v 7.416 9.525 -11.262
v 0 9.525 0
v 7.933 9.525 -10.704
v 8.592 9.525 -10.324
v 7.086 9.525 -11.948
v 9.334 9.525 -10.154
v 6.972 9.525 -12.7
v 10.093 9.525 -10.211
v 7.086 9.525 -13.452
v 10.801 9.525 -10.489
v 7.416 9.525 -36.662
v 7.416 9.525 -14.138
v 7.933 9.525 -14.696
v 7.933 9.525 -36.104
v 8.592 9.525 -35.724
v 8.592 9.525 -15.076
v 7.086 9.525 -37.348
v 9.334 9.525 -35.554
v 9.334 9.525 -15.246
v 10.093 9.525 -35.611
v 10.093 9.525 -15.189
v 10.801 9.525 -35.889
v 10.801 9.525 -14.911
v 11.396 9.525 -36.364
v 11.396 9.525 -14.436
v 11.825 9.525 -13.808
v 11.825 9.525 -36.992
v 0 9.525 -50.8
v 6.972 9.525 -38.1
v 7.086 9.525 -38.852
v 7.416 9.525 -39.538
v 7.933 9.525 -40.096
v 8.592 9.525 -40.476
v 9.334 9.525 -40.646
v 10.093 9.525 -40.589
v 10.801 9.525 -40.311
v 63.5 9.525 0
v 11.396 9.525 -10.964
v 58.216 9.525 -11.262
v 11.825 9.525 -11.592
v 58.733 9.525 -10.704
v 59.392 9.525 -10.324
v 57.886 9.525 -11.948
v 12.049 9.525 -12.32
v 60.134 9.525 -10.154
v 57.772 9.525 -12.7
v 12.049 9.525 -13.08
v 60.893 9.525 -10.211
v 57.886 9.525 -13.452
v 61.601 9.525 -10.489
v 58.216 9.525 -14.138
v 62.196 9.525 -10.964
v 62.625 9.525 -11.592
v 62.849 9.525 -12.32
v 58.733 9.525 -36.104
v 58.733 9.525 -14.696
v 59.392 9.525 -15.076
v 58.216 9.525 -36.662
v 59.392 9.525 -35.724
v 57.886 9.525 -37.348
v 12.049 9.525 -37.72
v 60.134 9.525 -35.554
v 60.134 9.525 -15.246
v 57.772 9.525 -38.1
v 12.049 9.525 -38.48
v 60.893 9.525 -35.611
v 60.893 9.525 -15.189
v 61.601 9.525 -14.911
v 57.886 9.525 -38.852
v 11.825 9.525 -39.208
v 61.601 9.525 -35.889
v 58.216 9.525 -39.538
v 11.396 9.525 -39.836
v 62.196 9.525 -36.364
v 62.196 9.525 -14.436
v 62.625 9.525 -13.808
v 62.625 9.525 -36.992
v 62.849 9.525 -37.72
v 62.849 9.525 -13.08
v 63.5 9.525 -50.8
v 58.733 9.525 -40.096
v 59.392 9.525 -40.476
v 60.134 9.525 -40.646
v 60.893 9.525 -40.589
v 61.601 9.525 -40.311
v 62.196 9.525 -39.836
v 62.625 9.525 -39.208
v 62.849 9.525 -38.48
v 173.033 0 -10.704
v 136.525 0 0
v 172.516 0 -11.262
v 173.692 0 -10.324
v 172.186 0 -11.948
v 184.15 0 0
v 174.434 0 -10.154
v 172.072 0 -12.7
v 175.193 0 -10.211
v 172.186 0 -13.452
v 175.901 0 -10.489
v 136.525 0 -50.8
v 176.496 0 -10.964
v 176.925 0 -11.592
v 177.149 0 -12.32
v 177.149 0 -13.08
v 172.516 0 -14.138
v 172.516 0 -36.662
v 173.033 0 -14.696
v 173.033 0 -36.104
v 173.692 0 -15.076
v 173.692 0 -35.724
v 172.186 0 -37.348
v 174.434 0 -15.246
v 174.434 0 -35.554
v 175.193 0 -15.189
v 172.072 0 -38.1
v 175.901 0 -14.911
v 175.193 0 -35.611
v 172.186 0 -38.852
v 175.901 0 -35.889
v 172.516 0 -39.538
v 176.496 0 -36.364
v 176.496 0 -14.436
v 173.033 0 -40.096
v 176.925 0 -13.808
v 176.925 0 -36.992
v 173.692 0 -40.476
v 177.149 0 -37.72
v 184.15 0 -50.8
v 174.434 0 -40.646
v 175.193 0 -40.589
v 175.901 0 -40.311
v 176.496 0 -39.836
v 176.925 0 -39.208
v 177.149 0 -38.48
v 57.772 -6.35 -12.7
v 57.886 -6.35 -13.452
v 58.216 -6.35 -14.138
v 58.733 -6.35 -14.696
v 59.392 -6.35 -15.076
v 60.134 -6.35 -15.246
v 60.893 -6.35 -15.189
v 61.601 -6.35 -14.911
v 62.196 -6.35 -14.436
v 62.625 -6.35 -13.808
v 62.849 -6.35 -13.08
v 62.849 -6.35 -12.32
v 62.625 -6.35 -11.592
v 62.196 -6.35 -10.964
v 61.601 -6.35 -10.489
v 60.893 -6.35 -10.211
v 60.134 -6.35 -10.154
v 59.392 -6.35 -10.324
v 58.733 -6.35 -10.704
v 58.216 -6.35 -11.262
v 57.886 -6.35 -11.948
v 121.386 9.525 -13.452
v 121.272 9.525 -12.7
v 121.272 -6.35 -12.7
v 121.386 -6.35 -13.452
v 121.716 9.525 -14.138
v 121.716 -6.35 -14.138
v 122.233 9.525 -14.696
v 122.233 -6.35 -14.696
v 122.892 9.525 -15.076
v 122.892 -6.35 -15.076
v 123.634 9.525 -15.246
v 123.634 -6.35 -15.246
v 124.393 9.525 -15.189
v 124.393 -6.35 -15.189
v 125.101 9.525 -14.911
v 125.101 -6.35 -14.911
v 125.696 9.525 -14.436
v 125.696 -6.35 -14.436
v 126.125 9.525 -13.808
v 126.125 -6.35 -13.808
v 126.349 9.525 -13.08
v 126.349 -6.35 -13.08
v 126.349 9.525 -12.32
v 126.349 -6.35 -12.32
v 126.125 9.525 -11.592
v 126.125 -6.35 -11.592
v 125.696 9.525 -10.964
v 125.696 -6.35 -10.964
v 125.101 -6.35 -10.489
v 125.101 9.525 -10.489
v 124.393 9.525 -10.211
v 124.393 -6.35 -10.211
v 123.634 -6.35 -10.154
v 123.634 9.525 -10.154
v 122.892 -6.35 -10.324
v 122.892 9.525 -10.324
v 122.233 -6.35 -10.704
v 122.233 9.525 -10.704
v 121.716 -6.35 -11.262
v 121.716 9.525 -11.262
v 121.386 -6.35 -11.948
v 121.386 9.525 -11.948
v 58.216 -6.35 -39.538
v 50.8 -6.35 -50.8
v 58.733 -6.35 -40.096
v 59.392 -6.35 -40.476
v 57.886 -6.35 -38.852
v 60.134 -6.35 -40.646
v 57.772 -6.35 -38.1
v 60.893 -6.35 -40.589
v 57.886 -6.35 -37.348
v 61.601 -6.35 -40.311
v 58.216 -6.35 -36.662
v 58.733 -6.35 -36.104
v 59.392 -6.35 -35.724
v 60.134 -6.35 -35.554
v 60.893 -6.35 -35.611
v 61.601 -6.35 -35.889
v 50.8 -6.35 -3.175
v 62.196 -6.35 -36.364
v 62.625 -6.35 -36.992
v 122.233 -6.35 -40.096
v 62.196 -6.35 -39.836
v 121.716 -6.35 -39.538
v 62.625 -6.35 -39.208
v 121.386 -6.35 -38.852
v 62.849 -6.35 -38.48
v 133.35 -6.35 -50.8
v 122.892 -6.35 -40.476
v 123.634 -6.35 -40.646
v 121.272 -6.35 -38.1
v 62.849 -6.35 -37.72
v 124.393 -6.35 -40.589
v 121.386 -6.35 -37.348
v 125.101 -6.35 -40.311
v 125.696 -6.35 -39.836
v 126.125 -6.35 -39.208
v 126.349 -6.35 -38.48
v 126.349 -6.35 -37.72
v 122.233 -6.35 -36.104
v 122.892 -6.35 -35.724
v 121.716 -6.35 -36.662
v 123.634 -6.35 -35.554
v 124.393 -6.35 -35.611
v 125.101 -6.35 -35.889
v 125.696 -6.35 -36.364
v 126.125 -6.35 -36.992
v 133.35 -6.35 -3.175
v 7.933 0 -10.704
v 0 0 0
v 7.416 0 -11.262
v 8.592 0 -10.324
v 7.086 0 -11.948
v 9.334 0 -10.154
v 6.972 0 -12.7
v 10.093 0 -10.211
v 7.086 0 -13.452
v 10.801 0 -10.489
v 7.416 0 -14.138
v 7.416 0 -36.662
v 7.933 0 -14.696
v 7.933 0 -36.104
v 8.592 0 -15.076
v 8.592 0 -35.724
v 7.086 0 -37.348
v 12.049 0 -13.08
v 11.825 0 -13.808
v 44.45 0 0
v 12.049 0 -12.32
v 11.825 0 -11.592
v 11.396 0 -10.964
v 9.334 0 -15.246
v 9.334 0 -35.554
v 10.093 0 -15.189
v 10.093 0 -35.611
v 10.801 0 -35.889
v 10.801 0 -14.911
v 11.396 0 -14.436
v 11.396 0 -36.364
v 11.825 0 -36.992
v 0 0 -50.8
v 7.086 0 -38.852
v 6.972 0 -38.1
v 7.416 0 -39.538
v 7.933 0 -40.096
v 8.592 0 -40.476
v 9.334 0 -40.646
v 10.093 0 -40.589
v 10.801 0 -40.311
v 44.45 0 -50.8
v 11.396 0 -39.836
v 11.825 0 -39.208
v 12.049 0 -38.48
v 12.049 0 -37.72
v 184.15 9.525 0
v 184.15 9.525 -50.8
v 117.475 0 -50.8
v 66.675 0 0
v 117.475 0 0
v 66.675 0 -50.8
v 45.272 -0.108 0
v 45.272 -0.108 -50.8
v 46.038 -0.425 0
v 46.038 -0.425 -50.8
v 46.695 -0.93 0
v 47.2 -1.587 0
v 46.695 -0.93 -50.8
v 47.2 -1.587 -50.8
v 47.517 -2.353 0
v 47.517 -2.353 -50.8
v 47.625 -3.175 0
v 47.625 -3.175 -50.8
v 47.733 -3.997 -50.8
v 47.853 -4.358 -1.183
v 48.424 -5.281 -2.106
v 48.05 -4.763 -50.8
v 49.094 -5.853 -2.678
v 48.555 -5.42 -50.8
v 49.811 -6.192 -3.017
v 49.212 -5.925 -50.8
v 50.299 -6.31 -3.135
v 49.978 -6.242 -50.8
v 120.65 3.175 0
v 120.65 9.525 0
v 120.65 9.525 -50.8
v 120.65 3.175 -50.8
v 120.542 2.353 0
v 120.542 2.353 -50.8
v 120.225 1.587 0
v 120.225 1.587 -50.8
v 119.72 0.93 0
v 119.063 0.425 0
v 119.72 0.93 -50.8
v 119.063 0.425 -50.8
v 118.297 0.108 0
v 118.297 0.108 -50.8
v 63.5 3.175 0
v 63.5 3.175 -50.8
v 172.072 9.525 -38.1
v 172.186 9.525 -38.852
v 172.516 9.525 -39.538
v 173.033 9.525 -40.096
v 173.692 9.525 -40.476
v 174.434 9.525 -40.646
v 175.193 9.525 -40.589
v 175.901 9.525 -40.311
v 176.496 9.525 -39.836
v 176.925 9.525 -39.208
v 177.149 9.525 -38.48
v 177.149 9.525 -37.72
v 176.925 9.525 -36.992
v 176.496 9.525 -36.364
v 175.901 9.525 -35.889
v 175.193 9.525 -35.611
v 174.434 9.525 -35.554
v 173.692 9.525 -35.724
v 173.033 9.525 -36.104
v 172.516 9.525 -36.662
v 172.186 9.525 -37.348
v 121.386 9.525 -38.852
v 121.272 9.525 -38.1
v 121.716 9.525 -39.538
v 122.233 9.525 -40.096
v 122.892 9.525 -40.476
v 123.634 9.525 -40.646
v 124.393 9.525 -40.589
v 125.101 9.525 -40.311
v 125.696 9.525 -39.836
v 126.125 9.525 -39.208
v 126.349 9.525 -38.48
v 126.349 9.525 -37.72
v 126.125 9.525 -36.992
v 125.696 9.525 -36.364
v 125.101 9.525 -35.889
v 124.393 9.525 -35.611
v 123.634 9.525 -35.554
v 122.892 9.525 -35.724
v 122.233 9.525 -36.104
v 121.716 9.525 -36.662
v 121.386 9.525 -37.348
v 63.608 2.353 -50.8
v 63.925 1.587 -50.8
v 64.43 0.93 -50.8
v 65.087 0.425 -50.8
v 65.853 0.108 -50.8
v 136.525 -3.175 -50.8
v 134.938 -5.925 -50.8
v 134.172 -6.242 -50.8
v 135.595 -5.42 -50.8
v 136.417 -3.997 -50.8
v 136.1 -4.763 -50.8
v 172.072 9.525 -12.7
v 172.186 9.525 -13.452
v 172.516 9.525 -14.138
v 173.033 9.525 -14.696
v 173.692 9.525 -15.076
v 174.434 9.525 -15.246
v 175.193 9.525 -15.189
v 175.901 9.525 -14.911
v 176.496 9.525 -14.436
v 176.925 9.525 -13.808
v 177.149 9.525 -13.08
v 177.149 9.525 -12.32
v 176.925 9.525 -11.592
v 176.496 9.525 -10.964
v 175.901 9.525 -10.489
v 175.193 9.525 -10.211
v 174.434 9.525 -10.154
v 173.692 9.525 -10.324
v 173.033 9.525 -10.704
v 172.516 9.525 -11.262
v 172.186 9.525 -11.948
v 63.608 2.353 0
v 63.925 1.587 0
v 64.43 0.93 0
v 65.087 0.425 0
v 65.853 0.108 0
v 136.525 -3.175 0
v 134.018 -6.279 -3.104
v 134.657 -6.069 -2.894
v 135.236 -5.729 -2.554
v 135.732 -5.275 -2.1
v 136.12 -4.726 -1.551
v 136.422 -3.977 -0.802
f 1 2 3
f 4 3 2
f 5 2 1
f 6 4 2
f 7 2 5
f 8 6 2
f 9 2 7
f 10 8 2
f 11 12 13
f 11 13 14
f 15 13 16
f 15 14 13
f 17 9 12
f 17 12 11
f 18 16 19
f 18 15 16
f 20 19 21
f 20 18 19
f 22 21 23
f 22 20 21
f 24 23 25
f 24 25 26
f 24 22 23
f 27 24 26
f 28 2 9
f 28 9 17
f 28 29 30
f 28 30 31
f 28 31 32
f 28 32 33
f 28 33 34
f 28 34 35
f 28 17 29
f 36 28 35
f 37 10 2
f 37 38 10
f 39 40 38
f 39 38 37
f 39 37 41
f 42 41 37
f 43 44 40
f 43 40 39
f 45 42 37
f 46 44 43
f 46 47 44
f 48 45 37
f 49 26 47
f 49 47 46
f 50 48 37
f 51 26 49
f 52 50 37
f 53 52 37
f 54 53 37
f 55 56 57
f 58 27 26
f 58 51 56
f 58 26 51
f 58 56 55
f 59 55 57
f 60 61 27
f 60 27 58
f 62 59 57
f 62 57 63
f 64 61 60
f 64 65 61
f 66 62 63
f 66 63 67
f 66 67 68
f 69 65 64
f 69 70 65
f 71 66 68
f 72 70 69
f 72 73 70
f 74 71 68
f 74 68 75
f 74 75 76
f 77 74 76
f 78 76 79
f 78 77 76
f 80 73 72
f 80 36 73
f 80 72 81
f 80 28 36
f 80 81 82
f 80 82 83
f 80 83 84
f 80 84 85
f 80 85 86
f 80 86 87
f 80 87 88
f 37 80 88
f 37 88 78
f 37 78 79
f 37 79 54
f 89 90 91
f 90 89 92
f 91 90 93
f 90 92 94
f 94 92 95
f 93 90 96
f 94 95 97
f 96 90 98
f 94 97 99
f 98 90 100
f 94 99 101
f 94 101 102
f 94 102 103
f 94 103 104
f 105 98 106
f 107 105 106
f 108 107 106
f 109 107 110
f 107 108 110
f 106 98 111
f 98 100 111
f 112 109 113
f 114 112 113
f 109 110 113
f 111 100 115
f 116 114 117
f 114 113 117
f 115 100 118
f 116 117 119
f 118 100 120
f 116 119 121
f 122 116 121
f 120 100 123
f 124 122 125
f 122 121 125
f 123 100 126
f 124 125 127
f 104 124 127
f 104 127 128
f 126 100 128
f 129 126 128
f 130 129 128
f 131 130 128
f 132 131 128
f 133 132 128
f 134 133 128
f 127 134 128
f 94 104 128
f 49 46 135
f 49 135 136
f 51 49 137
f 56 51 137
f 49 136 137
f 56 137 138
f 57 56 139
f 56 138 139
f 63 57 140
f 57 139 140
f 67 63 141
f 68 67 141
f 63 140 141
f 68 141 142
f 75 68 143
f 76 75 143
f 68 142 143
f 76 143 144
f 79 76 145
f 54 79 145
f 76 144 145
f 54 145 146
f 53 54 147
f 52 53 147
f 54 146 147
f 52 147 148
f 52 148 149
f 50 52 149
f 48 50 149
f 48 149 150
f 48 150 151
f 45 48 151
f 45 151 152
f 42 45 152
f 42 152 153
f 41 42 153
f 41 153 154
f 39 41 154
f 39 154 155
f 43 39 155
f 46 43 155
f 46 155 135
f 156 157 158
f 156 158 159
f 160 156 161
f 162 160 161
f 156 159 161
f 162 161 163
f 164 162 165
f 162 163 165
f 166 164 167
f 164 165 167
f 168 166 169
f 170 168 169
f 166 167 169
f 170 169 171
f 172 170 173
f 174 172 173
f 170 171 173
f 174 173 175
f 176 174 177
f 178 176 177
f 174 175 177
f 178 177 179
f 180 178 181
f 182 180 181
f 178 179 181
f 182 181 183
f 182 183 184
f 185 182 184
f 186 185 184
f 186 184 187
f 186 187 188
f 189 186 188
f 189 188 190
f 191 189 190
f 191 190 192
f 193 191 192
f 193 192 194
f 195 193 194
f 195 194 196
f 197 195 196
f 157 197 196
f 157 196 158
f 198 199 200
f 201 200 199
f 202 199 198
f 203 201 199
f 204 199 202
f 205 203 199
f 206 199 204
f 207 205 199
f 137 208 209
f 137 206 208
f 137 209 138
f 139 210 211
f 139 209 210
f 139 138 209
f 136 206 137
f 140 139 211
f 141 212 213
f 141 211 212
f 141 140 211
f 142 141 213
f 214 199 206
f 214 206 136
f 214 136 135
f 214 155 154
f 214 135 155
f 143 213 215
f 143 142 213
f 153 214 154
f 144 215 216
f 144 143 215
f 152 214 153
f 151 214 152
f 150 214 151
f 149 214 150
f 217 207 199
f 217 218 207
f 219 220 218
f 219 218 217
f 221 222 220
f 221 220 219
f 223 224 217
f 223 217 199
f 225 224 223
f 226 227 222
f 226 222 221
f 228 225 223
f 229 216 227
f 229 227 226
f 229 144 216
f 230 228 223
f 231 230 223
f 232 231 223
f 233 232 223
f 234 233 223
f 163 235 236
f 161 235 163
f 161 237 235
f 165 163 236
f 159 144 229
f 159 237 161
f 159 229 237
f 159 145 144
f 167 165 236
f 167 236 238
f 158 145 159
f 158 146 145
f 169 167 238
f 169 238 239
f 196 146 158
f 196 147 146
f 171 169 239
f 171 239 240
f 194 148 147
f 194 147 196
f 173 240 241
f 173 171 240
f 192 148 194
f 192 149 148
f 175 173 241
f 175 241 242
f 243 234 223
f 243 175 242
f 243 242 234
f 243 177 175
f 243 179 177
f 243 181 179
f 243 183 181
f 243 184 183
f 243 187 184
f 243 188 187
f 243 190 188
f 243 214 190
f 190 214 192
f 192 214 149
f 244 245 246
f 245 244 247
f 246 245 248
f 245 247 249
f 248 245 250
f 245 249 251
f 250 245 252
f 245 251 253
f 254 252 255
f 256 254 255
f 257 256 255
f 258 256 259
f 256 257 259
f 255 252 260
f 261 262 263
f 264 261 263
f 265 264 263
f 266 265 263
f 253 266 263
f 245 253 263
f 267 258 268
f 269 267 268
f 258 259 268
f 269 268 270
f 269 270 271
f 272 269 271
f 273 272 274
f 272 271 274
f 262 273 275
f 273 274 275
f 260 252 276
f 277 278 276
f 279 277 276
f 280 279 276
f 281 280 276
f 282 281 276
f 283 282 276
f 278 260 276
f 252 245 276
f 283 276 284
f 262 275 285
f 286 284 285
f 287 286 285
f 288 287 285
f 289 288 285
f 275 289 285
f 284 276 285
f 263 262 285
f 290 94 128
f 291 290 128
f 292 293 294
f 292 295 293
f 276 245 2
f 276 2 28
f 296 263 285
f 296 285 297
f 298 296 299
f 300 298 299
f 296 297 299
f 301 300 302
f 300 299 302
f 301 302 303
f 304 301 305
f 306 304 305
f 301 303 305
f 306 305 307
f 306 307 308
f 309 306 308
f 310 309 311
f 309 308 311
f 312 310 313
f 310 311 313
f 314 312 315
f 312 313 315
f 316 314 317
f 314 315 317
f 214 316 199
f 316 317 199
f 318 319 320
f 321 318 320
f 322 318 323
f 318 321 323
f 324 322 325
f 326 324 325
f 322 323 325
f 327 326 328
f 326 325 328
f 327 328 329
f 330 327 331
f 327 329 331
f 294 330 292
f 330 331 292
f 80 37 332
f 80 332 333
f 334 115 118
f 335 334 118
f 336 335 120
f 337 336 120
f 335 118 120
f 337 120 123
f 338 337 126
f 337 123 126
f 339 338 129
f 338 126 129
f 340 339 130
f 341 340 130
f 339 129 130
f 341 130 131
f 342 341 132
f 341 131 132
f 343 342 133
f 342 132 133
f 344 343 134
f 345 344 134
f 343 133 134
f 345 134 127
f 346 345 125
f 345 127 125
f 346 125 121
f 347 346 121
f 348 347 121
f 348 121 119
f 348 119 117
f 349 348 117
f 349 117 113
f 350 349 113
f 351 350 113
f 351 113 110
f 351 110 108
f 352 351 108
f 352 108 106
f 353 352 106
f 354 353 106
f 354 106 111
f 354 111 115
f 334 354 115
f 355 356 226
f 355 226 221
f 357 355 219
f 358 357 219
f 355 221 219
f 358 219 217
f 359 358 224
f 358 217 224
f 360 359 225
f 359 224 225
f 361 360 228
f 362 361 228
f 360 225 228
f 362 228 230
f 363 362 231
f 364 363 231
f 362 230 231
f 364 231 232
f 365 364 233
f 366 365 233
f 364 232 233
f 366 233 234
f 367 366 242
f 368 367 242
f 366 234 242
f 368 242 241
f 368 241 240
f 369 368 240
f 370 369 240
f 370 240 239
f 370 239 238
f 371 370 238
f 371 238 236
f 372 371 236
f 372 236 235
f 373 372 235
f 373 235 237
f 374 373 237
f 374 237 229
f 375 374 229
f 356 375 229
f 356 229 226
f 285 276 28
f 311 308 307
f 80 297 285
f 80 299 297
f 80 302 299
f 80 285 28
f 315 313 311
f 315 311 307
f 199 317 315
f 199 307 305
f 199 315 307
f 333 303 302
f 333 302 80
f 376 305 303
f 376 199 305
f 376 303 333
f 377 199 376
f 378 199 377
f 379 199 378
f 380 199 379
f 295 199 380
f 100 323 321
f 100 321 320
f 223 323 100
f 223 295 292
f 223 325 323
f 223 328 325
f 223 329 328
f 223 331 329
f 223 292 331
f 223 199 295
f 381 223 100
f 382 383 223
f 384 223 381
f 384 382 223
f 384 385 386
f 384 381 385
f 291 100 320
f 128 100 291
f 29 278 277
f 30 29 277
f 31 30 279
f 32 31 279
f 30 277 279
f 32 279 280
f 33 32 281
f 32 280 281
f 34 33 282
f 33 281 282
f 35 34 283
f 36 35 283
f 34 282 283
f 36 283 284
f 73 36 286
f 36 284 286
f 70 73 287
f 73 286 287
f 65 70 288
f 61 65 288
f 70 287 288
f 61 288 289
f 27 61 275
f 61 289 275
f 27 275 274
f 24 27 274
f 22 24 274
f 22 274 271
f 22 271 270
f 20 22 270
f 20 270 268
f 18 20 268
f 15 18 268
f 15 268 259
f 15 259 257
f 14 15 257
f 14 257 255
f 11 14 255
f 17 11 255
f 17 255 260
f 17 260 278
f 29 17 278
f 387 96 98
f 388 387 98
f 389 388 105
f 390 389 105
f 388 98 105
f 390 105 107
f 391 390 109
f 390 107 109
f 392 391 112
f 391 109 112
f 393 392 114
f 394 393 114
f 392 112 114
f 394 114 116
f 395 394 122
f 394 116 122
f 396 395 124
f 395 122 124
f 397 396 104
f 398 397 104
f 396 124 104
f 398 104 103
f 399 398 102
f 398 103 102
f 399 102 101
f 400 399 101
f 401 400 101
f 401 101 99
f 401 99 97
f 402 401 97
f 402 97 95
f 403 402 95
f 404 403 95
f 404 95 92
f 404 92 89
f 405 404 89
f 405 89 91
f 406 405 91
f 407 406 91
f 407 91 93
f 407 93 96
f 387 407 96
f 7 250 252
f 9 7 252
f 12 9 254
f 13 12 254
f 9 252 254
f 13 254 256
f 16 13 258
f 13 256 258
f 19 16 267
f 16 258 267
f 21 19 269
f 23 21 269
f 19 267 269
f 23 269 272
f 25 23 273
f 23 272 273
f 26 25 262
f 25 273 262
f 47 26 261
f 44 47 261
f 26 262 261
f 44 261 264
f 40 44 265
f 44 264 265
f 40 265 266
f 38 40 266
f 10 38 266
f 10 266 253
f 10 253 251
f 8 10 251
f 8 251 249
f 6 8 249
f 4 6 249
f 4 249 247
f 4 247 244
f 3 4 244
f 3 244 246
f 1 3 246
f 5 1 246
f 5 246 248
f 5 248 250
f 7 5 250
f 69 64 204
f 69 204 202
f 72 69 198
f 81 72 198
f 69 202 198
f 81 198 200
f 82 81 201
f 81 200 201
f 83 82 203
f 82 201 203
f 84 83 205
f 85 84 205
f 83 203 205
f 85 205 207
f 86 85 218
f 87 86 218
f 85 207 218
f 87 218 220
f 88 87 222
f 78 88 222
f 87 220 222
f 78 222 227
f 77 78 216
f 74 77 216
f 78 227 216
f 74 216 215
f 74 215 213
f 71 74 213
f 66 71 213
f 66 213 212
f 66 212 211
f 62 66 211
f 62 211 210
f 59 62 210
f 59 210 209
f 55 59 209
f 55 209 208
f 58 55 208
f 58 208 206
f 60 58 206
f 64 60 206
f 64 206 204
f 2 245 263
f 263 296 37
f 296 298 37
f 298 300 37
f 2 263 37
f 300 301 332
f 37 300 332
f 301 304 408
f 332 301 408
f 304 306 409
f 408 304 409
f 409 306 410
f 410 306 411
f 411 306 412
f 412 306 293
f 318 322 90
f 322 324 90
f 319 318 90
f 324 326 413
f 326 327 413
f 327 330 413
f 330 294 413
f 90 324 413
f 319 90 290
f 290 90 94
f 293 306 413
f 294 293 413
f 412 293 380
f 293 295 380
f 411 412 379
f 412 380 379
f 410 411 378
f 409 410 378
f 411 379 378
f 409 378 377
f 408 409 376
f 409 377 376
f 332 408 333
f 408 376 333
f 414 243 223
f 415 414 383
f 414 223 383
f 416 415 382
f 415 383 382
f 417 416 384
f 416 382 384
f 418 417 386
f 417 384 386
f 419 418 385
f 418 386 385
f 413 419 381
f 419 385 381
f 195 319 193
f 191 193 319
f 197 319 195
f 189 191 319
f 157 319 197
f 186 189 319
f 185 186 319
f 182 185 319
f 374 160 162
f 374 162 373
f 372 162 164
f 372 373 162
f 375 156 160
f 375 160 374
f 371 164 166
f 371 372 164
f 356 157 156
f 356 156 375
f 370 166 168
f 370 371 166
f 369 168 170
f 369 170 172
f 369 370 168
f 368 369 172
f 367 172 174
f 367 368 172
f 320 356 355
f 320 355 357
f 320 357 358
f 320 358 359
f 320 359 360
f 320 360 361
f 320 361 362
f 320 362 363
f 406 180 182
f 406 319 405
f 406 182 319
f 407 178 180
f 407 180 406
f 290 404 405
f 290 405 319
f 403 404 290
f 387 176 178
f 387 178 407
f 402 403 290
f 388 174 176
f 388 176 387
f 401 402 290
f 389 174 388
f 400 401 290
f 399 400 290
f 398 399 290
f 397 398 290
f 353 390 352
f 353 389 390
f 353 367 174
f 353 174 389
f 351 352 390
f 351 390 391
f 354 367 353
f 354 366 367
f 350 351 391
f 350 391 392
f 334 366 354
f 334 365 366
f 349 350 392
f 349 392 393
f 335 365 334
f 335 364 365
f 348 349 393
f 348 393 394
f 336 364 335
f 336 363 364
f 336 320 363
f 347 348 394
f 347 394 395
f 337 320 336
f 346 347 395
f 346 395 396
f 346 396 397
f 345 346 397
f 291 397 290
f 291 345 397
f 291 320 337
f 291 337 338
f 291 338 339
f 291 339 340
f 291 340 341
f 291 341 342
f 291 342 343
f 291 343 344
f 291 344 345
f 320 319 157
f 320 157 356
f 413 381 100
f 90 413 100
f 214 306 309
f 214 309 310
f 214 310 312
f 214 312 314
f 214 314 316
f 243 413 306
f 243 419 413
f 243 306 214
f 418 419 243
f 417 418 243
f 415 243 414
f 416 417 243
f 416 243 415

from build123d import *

# Parameters (mm, degrees)
SKETCH1_W              = 184.15
SKETCH1_H              = 50.8
BOSS_EXTRUDE1_DEPTH    = 9.525
SKETCH4_W              = 88.9
SKETCH4_H              = 6.35
BOSS_EXTRUDE2_DEPTH    = 50.8
SKETCH5_W              = 57.15
SKETCH5_H              = 50.8
CUT_EXTRUDE1_DEPTH     = 9.525
F_10_CLEARANCE_HOLE1_D = 5.1054
FILLET1_R              = 3.175
CHAMFER1_SIZE          = 3.175


# Some blends are built 0.0001 mm under size
with BuildPart() as part:
    # Sketch1 → Boss-Extrude1 (new body)
    with BuildSketch(Plane(origin=(0, 0, 0), x_dir=(1, 0, 0), z_dir=(0, 1, 0))):
        with Locations((92.075, 25.4)):
            Rectangle(SKETCH1_W, SKETCH1_H)
    extrude(amount=BOSS_EXTRUDE1_DEPTH)

    # Sketch4 → Boss-Extrude2 (add)
    with BuildSketch(Plane.XY):
        with Locations((92.075, -3.175)):
            Rectangle(SKETCH4_W, SKETCH4_H)
    extrude(amount=-BOSS_EXTRUDE2_DEPTH)

    # Sketch5 → Cut-Extrude1 (cut)
    with BuildSketch(Plane(origin=(0, 9.525, 0), x_dir=(1, 0, 0), z_dir=(0, 1, 0))):
        with Locations((92.075, 25.4)):
            Rectangle(SKETCH5_W, SKETCH5_H)
    extrude(amount=-CUT_EXTRUDE1_DEPTH, mode=Mode.SUBTRACT)

    # #10 Clearance Hole1 (through all)
    with Locations(Plane(origin=(0, 9.525, 0), x_dir=(1, 0, 0), z_dir=(0, 1, 0))):
        with Locations((9.525, 38.1), (9.525, 12.7), (60.325, 12.7), (60.325, 38.1), (123.825, 38.1), (123.825, 12.7), (174.625, 12.7), (174.625, 38.1)):
            Hole(F_10_CLEARANCE_HOLE1_D / 2)

    # Fillet1
    fillet1_edges = [part.edges().sort_by_distance(p)[0] for p in [
        (47.625, 0, -25.4),
        (47.625, -6.35, -25.4),
        (136.525, -6.35, -25.4),
        (63.5, 0, -25.4),
        (120.65, 0, -25.4),
    ]]
    fillet(fillet1_edges, radius=FILLET1_R - 0.0001)  # a hair under: the kernel refuses the full size

    # Chamfer1
    # the kernel refuses this chamfer: 3.175 mm, written as the material it takes off along each edge
    with BuildSketch(Plane(origin=(141.515193487, -6.35, 0), x_dir=(0, 0.9996219169112966, 0.02749587661058637), z_dir=(-1, 0, 0))) as chamfer1_piece_1:
        Polygon((CHAMFER1_SIZE * 0.999621916911, CHAMFER1_SIZE * 0.0274958766106), (-CHAMFER1_SIZE * 0.0274958766106, CHAMFER1_SIZE * 0.999621916911), (0, 0), align=None)
    extrude(amount=98.880386974, mode=Mode.SUBTRACT)


solid = part.part
